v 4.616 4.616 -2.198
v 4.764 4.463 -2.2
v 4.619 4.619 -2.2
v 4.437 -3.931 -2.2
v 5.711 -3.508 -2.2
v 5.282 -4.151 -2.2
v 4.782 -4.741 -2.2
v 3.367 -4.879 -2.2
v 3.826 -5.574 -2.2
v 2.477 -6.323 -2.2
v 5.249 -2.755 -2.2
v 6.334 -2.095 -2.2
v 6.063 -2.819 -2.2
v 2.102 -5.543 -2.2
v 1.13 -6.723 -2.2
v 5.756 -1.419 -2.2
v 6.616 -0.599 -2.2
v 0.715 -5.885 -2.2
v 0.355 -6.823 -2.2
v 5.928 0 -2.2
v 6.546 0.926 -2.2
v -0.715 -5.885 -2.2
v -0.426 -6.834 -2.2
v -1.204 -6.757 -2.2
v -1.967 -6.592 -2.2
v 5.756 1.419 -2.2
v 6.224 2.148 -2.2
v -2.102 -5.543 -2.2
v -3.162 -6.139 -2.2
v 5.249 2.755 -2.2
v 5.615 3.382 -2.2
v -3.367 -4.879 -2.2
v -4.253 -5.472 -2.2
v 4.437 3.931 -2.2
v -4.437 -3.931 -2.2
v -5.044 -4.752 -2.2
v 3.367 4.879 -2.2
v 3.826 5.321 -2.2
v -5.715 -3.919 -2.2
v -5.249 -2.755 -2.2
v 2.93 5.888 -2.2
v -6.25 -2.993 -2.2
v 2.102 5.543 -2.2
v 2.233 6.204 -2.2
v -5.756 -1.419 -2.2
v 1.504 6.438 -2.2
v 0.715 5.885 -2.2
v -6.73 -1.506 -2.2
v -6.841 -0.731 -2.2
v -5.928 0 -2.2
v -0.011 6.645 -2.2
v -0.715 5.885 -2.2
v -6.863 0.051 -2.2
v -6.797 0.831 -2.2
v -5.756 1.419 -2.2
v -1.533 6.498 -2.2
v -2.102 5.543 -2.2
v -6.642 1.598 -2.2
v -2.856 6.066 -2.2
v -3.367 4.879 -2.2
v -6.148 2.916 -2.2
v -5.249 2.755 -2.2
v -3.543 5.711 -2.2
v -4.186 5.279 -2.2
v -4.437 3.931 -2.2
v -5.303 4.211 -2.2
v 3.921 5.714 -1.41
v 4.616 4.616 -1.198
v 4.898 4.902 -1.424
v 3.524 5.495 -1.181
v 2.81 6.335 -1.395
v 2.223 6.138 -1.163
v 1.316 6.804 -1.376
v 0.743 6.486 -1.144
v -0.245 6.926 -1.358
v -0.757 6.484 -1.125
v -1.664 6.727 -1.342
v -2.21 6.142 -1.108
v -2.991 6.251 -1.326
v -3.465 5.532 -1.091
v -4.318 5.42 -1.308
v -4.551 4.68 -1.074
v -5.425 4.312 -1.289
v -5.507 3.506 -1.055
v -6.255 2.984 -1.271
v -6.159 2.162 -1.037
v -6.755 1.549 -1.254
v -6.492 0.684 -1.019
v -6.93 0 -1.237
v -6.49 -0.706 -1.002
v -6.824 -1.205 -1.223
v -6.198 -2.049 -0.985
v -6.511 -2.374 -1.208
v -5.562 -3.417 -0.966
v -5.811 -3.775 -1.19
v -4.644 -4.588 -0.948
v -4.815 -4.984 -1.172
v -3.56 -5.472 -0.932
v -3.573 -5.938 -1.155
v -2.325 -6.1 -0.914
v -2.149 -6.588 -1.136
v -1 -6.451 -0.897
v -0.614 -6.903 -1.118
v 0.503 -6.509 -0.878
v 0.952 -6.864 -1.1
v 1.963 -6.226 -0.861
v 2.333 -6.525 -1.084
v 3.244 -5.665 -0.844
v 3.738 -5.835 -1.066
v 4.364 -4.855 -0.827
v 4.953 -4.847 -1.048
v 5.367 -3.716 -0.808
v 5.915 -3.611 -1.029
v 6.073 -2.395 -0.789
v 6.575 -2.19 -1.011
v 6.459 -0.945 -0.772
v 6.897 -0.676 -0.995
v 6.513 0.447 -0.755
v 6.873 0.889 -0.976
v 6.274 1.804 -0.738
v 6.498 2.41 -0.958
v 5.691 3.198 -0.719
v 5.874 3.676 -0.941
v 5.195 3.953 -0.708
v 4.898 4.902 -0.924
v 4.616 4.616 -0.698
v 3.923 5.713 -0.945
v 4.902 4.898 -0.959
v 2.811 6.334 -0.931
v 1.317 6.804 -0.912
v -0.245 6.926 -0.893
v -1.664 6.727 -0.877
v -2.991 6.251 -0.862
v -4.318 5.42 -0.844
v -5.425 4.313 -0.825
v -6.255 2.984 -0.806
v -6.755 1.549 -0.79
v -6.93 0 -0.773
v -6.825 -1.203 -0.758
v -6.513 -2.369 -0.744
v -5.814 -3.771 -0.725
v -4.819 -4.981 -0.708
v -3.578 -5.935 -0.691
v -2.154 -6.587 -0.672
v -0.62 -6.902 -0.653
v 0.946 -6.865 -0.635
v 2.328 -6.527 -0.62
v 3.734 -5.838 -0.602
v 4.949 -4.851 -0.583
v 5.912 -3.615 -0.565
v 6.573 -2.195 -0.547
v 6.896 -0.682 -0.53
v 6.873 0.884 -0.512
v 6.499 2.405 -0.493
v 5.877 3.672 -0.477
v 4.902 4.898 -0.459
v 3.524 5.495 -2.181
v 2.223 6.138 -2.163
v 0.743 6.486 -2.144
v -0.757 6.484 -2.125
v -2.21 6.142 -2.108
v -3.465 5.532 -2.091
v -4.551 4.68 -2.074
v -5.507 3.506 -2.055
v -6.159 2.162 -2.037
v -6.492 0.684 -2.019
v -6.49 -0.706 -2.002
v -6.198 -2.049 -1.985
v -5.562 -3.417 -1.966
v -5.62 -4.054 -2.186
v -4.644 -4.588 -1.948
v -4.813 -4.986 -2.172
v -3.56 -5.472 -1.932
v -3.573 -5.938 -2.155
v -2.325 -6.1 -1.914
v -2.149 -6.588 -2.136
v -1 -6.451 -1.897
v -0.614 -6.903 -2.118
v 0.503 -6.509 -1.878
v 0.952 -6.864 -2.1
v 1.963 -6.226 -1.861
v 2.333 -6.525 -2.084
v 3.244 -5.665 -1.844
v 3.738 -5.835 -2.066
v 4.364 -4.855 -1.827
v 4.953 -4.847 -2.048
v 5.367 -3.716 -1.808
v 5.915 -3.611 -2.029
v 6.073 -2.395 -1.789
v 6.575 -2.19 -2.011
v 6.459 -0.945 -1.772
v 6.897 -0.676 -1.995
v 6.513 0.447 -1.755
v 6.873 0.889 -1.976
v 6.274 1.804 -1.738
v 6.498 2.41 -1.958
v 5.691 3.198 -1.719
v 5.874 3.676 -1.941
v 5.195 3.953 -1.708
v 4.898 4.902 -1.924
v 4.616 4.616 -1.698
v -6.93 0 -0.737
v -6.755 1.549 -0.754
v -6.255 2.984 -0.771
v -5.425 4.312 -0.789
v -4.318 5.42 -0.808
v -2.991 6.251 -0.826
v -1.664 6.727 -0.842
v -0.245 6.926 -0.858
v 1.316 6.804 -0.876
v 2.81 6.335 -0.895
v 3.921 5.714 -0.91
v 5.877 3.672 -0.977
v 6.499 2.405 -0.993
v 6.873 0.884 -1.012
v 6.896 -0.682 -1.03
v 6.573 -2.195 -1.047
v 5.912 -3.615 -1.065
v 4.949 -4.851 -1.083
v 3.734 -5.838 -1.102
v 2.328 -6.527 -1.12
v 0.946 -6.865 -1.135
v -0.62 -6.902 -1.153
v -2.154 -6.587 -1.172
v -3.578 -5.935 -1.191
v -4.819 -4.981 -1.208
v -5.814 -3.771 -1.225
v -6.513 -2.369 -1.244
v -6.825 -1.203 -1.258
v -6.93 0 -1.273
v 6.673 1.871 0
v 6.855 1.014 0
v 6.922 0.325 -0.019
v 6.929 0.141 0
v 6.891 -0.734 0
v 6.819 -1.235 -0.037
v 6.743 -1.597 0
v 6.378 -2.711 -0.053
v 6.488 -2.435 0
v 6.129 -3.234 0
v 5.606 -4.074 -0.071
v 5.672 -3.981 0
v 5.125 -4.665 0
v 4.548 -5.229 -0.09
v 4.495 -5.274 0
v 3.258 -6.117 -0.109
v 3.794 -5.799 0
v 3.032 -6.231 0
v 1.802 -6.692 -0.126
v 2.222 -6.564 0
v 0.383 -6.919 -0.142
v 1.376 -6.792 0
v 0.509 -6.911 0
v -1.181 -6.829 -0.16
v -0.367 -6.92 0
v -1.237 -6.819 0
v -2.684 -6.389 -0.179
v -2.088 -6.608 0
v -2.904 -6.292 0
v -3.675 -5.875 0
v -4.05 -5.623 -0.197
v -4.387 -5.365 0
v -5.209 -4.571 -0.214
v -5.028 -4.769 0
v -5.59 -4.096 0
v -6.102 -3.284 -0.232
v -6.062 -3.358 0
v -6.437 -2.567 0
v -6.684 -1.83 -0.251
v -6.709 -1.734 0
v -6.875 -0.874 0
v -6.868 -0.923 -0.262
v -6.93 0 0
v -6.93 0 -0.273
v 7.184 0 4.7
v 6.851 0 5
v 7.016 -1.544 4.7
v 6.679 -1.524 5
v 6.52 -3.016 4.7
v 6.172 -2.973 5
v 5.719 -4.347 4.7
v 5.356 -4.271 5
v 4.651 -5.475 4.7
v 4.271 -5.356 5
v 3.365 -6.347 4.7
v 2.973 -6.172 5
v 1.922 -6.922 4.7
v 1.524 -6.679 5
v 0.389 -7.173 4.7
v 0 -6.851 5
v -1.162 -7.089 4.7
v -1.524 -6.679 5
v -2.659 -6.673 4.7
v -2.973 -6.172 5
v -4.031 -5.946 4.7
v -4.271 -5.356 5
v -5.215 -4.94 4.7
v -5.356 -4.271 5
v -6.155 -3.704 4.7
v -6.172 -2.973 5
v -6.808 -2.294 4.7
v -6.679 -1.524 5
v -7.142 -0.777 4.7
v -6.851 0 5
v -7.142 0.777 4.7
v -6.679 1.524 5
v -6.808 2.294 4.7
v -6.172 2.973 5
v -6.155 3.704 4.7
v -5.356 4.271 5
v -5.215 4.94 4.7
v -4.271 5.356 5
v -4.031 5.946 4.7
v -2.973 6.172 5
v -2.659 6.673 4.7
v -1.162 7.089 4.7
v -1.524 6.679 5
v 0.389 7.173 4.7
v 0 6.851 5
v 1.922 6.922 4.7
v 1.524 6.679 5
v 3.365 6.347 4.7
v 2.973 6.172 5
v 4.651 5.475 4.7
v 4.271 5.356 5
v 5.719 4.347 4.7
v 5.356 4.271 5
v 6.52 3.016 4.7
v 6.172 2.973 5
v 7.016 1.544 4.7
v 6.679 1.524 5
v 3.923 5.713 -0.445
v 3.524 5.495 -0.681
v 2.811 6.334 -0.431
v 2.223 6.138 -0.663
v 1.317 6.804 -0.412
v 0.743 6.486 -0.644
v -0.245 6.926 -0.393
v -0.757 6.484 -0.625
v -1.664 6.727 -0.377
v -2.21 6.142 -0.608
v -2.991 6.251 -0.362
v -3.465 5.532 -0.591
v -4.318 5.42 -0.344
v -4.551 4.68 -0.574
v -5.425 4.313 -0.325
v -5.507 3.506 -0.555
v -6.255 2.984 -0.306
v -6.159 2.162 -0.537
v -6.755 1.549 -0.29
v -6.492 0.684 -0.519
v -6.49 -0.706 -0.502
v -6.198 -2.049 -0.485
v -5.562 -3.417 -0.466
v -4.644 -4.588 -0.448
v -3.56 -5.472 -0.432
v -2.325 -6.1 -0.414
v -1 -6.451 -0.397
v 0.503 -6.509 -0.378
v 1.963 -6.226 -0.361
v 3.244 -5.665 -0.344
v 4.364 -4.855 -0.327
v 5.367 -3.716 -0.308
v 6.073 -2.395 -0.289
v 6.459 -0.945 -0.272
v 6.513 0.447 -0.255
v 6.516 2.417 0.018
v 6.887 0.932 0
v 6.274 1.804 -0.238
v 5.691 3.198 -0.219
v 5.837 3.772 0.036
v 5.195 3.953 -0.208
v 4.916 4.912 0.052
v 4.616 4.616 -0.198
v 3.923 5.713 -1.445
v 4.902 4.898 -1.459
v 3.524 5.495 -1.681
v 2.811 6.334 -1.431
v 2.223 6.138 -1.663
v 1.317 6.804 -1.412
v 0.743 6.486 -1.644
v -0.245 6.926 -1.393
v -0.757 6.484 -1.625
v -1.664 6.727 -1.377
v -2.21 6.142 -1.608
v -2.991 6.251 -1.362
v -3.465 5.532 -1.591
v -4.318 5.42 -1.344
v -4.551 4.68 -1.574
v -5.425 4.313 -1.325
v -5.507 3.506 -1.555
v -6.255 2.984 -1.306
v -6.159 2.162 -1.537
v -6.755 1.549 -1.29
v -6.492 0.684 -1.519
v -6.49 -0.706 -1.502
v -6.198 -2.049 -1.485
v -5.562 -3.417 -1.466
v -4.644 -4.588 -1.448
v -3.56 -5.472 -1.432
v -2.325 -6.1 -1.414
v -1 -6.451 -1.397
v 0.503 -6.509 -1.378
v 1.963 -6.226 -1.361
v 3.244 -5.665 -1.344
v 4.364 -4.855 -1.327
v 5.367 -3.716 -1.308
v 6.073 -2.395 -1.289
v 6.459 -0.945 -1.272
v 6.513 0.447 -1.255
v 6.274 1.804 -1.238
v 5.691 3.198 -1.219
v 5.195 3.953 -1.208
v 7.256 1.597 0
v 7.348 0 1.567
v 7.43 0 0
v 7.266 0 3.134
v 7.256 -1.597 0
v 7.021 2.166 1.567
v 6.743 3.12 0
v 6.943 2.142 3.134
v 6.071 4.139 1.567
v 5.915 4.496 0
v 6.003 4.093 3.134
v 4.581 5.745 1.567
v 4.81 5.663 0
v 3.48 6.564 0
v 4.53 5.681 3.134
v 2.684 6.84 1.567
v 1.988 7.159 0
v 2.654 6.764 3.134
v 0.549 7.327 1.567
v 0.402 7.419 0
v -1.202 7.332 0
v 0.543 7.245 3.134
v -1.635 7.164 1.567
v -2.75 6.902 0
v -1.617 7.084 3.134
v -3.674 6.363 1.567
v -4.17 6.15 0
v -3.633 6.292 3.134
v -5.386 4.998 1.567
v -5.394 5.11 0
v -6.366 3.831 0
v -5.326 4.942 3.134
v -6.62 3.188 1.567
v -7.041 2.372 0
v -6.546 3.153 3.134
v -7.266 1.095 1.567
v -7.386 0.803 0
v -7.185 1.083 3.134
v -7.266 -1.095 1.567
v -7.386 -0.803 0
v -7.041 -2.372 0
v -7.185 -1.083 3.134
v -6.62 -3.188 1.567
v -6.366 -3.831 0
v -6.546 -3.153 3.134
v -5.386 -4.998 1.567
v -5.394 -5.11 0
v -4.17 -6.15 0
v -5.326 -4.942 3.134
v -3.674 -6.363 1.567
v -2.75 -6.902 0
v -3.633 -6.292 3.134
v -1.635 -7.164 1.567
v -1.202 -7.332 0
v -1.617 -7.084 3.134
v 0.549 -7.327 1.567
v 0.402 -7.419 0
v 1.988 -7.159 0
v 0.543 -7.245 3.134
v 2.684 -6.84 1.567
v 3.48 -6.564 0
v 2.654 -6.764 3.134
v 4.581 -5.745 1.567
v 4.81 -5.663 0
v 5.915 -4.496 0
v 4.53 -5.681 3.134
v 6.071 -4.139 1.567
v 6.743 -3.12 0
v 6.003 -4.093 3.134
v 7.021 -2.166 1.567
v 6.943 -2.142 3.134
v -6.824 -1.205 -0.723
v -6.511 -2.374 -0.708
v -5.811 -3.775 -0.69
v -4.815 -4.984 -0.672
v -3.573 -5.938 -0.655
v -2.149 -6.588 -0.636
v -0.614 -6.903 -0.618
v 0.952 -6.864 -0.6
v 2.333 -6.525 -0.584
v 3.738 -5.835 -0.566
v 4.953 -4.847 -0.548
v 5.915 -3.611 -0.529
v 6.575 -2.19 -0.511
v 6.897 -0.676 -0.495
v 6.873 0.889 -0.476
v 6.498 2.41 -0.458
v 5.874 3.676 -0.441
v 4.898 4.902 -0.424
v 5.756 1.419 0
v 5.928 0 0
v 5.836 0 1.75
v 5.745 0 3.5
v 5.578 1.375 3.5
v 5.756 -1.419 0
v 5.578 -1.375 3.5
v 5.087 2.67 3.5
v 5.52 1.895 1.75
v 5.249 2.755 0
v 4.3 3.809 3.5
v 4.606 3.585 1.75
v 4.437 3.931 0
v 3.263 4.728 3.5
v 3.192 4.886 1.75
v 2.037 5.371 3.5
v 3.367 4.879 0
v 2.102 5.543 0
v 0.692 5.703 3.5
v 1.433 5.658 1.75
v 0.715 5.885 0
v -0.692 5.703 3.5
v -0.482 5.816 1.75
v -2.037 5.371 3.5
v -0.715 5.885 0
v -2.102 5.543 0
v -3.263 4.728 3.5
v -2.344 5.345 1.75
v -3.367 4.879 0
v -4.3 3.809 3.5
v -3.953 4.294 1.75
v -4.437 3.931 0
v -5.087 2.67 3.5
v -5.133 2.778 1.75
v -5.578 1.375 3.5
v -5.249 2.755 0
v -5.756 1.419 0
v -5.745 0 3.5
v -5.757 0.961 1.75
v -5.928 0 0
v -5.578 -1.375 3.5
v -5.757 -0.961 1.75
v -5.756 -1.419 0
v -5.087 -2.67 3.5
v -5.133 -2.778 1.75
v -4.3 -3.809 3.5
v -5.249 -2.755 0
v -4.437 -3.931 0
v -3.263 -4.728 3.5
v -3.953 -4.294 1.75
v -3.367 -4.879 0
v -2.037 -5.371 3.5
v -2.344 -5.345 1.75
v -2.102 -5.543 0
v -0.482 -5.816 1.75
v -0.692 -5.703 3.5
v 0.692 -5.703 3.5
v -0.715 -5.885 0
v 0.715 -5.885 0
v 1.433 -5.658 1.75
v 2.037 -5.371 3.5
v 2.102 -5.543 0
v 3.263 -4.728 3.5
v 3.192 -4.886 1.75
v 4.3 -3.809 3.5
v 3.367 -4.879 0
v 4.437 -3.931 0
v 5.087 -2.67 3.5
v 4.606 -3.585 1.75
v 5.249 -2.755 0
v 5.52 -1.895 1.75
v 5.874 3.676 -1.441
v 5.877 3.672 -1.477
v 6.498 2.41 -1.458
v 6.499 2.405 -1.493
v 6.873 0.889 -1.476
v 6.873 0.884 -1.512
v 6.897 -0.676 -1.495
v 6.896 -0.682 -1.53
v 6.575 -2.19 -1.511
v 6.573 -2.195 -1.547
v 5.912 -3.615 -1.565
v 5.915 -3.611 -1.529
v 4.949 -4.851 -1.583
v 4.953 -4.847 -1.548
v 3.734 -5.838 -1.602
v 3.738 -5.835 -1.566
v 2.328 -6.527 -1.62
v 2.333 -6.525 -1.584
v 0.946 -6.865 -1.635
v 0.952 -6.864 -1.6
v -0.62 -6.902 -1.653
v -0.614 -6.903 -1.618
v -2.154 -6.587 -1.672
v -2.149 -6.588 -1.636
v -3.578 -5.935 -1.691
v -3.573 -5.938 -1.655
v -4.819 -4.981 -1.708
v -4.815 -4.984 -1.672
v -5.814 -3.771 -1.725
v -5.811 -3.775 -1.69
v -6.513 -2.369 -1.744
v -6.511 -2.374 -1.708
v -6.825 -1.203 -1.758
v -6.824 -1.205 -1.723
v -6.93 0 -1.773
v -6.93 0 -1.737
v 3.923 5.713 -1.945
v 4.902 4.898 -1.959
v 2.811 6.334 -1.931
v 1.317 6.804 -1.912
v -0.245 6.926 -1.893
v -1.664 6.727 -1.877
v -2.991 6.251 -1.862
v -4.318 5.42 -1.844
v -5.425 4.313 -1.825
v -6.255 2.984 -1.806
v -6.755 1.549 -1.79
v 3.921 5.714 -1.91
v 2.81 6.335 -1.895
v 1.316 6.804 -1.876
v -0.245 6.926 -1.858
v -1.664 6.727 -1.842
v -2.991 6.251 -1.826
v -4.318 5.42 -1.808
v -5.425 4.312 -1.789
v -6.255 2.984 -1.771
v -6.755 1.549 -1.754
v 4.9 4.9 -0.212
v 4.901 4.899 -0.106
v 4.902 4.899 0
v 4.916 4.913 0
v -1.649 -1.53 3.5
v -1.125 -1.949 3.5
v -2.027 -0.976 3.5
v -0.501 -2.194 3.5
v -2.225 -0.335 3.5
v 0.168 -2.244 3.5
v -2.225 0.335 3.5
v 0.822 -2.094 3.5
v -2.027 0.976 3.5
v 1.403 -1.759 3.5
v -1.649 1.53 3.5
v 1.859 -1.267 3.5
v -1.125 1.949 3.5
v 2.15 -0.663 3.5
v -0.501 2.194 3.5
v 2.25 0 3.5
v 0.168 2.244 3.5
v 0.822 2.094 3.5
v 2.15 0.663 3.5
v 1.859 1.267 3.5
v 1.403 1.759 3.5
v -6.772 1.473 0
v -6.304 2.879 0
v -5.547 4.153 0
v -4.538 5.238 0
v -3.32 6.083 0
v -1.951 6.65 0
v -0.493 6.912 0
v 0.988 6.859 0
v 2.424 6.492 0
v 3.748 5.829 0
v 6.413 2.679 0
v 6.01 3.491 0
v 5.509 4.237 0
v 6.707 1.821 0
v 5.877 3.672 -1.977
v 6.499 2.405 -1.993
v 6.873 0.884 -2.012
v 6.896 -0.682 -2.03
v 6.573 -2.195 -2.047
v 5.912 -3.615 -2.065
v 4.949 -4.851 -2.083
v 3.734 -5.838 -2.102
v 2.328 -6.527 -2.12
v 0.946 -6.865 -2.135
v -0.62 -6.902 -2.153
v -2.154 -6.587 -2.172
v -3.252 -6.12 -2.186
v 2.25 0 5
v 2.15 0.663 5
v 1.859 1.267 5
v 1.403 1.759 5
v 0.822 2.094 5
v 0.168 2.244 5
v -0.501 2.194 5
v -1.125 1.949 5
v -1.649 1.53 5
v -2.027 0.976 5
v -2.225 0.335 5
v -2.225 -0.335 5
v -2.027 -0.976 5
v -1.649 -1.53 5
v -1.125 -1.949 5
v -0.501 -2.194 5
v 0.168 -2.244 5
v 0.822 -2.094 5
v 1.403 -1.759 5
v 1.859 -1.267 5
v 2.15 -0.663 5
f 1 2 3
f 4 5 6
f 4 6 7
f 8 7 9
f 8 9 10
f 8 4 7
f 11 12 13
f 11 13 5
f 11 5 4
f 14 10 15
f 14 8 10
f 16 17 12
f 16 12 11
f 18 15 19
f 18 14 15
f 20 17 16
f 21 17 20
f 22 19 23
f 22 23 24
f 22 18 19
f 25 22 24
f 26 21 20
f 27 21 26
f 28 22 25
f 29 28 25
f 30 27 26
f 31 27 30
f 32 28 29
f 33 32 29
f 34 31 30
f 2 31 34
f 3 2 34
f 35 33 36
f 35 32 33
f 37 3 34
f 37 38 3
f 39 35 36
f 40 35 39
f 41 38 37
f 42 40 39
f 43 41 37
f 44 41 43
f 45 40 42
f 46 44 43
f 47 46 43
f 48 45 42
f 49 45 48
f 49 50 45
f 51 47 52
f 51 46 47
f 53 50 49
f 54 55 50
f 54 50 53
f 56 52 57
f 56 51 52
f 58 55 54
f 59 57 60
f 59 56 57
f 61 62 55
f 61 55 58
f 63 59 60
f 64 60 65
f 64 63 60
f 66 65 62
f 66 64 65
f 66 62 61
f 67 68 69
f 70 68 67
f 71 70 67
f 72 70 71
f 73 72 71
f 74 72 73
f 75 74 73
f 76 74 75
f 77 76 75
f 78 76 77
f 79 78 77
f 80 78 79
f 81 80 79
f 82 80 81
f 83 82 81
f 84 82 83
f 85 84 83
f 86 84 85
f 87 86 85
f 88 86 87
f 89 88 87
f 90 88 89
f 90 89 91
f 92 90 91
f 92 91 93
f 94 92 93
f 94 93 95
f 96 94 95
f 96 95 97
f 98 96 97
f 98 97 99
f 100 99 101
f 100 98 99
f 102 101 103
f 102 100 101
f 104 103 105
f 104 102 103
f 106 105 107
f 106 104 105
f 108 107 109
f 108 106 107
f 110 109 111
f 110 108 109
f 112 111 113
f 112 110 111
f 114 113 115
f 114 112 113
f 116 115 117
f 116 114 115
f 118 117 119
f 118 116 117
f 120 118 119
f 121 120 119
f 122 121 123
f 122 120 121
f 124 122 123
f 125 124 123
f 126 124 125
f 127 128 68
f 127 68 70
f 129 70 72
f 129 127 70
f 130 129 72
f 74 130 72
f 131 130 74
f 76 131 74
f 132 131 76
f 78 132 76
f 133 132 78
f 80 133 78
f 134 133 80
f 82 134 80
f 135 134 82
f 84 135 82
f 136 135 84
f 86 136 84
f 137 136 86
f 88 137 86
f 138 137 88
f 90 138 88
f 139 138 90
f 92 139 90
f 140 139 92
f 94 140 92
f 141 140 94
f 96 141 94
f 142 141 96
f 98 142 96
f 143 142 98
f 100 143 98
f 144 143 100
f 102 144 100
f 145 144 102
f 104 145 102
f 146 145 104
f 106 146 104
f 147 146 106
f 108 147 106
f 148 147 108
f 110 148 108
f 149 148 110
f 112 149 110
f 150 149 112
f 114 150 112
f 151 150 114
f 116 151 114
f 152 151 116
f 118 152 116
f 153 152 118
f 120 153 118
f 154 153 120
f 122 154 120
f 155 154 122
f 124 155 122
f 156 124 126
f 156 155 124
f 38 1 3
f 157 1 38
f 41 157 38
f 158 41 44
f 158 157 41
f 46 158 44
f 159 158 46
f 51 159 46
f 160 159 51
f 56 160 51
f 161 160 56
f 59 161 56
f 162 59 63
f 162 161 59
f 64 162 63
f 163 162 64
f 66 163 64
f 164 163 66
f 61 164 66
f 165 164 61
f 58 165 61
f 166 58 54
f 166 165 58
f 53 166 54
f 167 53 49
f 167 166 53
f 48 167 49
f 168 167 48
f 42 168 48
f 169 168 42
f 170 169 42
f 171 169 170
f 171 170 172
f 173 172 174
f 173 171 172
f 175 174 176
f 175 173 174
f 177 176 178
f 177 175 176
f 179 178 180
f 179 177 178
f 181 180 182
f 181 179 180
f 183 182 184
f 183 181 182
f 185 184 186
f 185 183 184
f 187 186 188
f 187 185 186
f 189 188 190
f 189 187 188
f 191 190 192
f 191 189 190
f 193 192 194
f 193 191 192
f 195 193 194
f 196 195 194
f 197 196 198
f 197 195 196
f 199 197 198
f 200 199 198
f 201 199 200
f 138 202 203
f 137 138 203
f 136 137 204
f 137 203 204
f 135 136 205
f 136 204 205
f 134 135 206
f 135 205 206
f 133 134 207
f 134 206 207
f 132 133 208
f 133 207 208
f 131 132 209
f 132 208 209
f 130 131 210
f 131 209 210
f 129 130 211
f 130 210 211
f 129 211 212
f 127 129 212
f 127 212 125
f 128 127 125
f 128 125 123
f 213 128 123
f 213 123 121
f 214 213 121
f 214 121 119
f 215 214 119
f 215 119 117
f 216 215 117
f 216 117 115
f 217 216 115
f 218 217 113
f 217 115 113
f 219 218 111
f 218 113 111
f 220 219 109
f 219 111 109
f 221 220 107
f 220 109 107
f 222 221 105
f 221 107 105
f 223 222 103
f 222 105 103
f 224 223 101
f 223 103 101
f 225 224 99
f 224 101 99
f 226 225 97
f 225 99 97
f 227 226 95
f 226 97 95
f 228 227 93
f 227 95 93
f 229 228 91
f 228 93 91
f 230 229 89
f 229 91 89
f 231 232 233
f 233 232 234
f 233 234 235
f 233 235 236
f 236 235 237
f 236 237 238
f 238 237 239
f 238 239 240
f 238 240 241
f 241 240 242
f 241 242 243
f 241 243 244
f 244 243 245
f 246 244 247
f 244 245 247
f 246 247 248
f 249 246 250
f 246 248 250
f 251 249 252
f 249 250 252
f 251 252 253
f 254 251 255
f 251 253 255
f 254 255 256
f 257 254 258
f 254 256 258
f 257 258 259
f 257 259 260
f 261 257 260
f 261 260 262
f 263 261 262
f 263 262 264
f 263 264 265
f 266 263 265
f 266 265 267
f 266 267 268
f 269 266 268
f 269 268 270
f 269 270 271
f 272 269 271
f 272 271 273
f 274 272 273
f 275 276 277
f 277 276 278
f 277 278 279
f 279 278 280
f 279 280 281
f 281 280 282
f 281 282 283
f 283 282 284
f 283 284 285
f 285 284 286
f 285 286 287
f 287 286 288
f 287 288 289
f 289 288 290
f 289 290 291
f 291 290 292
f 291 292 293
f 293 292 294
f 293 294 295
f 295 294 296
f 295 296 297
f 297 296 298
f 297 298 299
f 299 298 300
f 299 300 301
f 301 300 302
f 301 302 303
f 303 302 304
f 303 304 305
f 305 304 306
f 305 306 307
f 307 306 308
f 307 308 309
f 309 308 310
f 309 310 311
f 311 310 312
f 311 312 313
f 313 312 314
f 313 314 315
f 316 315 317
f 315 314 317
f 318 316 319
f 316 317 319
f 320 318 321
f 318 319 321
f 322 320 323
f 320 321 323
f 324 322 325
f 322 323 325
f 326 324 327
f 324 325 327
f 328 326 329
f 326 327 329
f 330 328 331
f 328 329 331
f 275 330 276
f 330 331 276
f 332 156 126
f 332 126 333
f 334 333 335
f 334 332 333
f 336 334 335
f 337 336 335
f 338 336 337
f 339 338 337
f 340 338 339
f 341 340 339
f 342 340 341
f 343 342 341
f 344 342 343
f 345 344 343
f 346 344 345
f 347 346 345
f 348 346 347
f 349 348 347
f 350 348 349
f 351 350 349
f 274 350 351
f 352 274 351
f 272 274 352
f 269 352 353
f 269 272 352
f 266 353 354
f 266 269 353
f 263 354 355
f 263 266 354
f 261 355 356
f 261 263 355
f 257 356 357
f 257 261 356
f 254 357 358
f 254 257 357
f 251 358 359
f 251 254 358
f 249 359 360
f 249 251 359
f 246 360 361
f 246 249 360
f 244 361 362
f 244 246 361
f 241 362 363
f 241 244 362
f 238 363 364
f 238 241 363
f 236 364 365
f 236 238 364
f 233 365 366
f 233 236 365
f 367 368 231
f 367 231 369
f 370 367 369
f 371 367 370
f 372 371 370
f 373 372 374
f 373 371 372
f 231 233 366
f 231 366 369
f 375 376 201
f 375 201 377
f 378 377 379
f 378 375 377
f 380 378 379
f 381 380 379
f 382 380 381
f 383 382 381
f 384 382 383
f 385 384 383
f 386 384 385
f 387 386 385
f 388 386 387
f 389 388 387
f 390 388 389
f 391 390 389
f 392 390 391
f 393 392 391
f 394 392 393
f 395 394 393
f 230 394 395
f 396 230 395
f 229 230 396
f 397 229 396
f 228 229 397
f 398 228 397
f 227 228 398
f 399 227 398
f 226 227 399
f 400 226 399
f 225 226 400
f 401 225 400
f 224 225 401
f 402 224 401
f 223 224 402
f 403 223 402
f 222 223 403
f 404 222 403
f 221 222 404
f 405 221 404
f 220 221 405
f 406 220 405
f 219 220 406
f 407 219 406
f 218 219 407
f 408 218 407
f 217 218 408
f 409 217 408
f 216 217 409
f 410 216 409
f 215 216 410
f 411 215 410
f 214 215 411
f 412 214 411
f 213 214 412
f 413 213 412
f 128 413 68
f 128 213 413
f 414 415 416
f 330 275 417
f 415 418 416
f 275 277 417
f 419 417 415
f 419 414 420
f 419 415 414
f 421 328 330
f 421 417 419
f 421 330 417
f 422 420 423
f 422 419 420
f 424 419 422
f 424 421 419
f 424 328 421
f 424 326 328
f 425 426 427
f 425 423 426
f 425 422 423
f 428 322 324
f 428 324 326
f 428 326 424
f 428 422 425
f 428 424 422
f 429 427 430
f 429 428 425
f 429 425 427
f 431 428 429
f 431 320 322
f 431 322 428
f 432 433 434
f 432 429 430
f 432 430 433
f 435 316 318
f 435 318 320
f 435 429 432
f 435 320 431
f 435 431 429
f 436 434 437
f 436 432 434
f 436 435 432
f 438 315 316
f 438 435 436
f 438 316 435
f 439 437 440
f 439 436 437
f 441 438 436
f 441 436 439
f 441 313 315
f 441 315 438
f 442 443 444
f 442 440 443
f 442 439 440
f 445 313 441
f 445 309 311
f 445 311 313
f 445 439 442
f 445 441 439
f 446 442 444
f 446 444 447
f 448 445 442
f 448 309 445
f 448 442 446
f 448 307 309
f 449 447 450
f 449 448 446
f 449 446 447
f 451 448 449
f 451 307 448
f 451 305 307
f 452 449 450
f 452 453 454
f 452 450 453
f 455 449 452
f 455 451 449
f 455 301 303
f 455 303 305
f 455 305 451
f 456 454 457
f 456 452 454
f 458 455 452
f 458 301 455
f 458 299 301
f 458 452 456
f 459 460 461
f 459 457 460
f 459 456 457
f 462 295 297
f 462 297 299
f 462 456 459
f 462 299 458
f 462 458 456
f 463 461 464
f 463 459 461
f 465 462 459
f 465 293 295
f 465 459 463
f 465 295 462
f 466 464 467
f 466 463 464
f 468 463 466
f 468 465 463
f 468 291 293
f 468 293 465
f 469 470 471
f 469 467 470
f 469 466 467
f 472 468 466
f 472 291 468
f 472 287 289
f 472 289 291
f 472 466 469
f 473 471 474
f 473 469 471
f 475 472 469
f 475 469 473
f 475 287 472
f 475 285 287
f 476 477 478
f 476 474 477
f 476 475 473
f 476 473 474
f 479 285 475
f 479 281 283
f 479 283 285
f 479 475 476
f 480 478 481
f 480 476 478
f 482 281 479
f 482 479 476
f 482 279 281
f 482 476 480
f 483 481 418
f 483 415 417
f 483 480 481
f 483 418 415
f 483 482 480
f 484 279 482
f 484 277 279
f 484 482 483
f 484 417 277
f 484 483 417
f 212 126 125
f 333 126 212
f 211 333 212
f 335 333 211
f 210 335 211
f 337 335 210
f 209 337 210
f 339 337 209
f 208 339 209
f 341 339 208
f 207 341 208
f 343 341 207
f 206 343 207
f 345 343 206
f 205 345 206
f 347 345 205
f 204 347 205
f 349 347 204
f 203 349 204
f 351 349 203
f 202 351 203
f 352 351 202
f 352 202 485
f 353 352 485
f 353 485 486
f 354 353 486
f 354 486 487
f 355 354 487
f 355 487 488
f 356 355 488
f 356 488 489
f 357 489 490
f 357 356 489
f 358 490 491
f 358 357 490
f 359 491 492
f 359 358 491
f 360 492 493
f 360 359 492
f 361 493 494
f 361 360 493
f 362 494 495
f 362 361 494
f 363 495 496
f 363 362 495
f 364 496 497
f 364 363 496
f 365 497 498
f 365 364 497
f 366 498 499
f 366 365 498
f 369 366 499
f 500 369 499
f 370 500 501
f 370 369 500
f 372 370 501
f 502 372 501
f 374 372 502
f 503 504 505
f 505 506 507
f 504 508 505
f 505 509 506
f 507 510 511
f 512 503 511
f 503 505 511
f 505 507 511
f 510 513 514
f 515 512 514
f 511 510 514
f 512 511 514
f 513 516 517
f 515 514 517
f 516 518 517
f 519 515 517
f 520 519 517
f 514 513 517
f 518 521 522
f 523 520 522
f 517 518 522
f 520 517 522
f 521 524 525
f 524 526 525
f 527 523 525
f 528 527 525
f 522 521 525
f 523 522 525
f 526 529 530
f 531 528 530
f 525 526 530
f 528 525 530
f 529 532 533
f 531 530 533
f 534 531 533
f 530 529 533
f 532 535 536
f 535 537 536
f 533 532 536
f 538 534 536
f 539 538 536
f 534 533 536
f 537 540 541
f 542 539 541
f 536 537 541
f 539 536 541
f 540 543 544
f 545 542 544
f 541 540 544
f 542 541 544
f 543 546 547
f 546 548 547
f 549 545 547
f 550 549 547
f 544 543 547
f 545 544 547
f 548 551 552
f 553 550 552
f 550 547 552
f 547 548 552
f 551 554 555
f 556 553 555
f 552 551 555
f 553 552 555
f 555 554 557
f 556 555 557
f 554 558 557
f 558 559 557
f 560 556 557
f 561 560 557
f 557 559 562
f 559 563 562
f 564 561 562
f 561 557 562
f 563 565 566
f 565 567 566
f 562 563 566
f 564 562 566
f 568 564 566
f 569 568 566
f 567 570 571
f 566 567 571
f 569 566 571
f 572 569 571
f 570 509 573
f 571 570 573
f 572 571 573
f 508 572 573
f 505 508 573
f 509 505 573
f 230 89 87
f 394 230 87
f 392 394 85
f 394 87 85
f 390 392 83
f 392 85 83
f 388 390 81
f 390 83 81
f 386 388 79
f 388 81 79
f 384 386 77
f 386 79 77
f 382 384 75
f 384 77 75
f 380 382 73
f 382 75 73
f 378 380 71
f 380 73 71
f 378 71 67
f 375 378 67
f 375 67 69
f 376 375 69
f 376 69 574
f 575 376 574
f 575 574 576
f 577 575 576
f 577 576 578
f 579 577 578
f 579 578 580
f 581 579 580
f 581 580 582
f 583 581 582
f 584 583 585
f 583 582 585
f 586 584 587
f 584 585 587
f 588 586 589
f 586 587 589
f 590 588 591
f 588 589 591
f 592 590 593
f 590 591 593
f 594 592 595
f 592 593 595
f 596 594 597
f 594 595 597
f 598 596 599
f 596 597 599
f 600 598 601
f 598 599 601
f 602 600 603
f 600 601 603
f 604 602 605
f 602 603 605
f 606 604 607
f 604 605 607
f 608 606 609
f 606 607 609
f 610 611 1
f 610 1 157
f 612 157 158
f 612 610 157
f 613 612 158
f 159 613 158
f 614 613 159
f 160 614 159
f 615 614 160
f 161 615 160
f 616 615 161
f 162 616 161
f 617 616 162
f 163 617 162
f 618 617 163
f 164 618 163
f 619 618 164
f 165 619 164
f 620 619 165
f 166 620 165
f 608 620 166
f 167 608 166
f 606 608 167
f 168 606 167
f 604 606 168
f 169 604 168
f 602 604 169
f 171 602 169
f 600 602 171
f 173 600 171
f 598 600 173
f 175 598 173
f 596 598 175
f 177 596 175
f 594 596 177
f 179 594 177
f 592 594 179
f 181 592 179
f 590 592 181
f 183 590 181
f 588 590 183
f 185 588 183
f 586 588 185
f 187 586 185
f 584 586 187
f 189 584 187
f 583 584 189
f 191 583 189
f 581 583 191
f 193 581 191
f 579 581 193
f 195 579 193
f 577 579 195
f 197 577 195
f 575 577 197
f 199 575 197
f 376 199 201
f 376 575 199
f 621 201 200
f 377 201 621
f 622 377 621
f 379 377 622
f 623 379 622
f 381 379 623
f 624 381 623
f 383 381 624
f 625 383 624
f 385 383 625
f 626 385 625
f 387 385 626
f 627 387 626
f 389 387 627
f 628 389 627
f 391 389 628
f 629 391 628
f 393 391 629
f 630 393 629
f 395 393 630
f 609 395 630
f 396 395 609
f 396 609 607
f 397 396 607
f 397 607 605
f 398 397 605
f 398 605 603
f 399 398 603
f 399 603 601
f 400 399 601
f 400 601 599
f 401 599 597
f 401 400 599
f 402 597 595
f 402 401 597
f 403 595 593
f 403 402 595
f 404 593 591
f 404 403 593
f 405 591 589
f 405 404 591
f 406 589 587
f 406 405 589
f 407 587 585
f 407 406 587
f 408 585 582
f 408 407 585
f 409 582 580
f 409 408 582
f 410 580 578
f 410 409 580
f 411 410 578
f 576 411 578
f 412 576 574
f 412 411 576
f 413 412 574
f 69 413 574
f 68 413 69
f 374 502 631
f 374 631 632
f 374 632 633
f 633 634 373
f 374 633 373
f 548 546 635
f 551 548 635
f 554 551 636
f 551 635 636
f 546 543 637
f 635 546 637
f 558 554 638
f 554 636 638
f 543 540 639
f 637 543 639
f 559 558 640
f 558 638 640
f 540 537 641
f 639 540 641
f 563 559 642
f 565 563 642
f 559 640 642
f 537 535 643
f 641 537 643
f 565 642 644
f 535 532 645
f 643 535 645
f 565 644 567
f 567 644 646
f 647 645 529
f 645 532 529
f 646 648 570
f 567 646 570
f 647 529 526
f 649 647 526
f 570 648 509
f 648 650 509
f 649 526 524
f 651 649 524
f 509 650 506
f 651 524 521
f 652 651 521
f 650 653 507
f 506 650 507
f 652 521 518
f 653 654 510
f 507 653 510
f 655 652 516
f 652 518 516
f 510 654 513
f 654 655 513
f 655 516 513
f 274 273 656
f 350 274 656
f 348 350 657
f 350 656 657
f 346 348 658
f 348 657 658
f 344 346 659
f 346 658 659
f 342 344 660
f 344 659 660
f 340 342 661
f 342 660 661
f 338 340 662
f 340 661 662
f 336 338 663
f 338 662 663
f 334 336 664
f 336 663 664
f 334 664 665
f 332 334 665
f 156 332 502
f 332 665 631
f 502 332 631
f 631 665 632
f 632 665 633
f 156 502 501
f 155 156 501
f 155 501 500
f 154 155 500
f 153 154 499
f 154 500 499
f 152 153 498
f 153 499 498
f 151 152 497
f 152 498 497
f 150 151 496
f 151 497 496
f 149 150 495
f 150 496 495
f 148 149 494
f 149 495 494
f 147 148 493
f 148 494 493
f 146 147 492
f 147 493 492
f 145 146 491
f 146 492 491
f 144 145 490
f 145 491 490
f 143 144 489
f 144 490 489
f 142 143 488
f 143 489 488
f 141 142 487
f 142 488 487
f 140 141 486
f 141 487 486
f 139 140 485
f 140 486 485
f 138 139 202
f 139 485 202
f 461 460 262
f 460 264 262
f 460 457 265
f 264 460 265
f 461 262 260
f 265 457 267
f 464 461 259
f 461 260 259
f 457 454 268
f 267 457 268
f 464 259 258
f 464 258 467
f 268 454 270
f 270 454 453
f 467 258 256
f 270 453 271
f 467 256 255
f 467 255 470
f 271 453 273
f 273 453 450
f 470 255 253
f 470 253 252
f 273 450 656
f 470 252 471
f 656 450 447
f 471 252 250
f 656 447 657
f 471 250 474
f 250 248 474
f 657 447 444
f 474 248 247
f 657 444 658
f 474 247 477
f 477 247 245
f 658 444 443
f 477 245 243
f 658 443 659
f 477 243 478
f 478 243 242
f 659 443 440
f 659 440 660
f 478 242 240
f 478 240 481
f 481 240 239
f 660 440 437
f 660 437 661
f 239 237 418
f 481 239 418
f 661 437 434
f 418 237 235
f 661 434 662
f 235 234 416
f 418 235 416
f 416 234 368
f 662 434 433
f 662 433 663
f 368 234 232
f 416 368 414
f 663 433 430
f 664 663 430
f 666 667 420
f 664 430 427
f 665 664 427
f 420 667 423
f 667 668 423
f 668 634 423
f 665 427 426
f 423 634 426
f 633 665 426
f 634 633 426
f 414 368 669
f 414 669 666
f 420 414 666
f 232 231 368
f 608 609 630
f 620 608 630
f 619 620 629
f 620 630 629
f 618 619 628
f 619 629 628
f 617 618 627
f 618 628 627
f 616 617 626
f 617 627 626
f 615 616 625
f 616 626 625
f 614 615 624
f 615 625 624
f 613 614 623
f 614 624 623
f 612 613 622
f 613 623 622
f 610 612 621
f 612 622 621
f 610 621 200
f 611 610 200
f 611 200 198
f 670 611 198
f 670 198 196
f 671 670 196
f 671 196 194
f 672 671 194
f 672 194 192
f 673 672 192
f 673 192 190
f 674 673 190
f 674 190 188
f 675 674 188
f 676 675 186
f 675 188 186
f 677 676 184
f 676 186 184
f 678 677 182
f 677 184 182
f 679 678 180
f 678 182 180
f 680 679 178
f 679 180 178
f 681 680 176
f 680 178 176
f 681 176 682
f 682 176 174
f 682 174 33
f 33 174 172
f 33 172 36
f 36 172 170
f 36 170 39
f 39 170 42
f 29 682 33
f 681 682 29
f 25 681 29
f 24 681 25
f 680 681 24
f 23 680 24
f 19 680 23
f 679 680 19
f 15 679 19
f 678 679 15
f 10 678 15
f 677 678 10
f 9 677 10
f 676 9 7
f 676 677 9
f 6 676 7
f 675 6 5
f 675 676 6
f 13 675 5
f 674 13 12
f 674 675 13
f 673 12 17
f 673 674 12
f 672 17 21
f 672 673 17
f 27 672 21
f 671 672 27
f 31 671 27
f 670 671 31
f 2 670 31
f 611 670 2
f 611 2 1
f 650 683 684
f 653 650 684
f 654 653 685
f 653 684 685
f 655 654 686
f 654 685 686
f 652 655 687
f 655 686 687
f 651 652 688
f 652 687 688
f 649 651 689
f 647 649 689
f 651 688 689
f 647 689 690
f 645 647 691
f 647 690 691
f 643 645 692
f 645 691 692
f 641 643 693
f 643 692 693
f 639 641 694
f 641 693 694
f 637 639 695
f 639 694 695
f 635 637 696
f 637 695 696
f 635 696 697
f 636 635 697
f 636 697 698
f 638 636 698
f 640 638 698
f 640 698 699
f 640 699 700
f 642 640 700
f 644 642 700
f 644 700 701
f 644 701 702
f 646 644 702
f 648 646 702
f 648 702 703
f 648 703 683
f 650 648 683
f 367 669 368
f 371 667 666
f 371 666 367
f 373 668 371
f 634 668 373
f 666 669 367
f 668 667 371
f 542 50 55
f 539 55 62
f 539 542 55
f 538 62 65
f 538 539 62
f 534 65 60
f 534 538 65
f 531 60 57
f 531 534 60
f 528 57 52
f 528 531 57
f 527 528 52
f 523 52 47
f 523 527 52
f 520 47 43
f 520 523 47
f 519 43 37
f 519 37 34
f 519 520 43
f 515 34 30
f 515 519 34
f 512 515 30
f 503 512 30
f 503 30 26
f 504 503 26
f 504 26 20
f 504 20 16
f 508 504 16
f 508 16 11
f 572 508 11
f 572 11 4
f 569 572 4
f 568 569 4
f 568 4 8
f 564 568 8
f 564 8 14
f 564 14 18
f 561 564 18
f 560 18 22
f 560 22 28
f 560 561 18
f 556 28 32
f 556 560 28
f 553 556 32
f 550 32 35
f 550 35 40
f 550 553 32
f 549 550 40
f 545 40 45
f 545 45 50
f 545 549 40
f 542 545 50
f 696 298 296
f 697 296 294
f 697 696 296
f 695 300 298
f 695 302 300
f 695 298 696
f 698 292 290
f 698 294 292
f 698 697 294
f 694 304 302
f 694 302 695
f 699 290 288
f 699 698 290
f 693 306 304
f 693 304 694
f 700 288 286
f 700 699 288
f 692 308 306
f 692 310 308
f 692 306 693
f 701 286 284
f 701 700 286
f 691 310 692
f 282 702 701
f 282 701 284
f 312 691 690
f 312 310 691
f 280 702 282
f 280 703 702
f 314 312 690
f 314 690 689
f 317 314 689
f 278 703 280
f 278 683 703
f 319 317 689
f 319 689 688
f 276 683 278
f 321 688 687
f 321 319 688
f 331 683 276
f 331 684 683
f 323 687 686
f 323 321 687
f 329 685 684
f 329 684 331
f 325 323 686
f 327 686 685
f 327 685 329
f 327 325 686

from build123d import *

# Parameters (mm, degrees)
SKETCH1_R           = 7.43
BOSS_EXTRUDE3_DEPTH = 5
BOSS_EXTRUDE3_TAPER = 3
SHELL1_T            = -1.5
SKETCH3_R           = 6.93
SKETCH3_R_2         = 5.927941481
BOSS_EXTRUDE4_DEPTH = 2.2
CUT_SWEEP1_PITCH    = 0.5
CHAMFER1_SIZE       = 0.3
CHAMFER1_SIZE_2     = 0.317026351
SKETCH7_R           = 2.25
CUT_EXTRUDE1_DEPTH  = 6


with BuildPart() as part:
    # Sketch1 → Boss-Extrude3 (new body)
    with BuildSketch(Plane.XY):
        Circle(SKETCH1_R)
    extrude(amount=BOSS_EXTRUDE3_DEPTH, taper=BOSS_EXTRUDE3_TAPER)

    # Shell1
    shell1_openings = [part.faces().sort_by_distance(p)[0] for p in [
        (0, 0, 0),
    ]]
    offset(amount=SHELL1_T, openings=shell1_openings, kind=Kind.INTERSECTION)


with BuildPart() as body_2:
    # Sketch3 → Boss-Extrude4 (new body)
    with BuildSketch(Plane(origin=(0, 0, 0), x_dir=(-1, 0, 0), z_dir=(0, 0, -1))):
        Circle(SKETCH3_R)
        Circle(SKETCH3_R_2, mode=Mode.SUBTRACT)
    extrude(amount=BOSS_EXTRUDE4_DEPTH)


with BuildPart() as part_1:
    add(part.part)

    # Combine1: union body 2
    add(body_2.part)

    # Cut-Sweep1: arcs per turn and ends read off the stored shape
    # Cut-Sweep1: the profile of Sketch6 screwed along a right-hand helix through 5 turns, 6 arcs to a turn; built about Z, then put on its axis
    cut_sweep1_z = Axis((0, 0, 0), (0, 0, 1))
    cut_sweep1_corners = [(6.527962418, -2.7236e-05, -0.497628173), (6.94947392, -0.002896154, -0.24778858), (6.955099869, 0.002729794, -0.737723981)]
    with BuildLine(mode=Mode.PRIVATE) as cut_sweep1_profile:
        Line(cut_sweep1_corners[0], cut_sweep1_corners[1])
        Line(cut_sweep1_corners[1], cut_sweep1_corners[2])
        Line(cut_sweep1_corners[2], cut_sweep1_corners[0])
    cut_sweep1_cap = Face(cut_sweep1_profile.wire())
    cut_sweep1_turn_angles = [0, 30, 60, 90, 120, 150, 180, 210, 240, 270, 300, 330, 360]
    cut_sweep1_turn_weights = [1, 0.8660254037844387, 1, 0.8660254037844387, 1, 0.8660254037844387, 1, 0.8660254037844387, 1, 0.8660254037844387, 1, 0.8660254037844387, 1]
    cut_sweep1_turn_rails = [Edge.make_bspline([Vector(p[0], p[1], 0).rotate(cut_sweep1_z, cut_sweep1_turn_angles[k]) / cut_sweep1_turn_weights[k] + Vector(0, 0, p[2] + CUT_SWEEP1_PITCH * cut_sweep1_turn_angles[k] / 360) for k in range(13)], [0, 0, 0, 1, 1, 2, 2, 3, 3, 4, 4, 5, 5, 6, 6, 6], 2, cut_sweep1_turn_weights) for p in cut_sweep1_corners]
    cut_sweep1_turn_sides = [Face.make_surface_from_curves(cut_sweep1_turn_rails[p[0]], cut_sweep1_turn_rails[p[1]]) for p in [(0, 1), (1, 2), (2, 0)]]
    cut_sweep1 = Plane(origin=(0, 0, -2.2), x_dir=(0.7071067811865512, 0.7071067811865438, 0), z_dir=(0, 0, 1)) * Solid(Shell([*[p.moved(Location((0, 0, CUT_SWEEP1_PITCH * i))) for i in range(5) for p in cut_sweep1_turn_sides], cut_sweep1_cap, cut_sweep1_cap.rotate(cut_sweep1_z, 1800).moved(Location((0, 0, CUT_SWEEP1_PITCH * 1800 / 360)))]))
    add(cut_sweep1, mode=Mode.SUBTRACT)

    # Chamfer1
    # the kernel refuses this chamfer: 0.317026351, 0.3 mm, written as the material it takes off along each edge
    with BuildSketch(Plane(origin=(0, 0, 5), x_dir=(1, 0, 0), z_dir=(0, 1, 0))) as chamfer1_piece_1:
        Polygon((7.167961104 + CHAMFER1_SIZE * 0.0523359562429, CHAMFER1_SIZE * 0.998629534755), (7.167961104 - CHAMFER1_SIZE_2, 0), (7.167961104, 0), align=None)
    revolve(axis=Axis((0, 0, 5), (0, 0, -1)), mode=Mode.SUBTRACT)

    # Sketch7 → Cut-Extrude1 (cut)
    with BuildSketch(Plane.XY.offset(5)):
        Circle(SKETCH7_R)
    extrude(amount=-CUT_EXTRUDE1_DEPTH, mode=Mode.SUBTRACT)


solid = part_1.part
